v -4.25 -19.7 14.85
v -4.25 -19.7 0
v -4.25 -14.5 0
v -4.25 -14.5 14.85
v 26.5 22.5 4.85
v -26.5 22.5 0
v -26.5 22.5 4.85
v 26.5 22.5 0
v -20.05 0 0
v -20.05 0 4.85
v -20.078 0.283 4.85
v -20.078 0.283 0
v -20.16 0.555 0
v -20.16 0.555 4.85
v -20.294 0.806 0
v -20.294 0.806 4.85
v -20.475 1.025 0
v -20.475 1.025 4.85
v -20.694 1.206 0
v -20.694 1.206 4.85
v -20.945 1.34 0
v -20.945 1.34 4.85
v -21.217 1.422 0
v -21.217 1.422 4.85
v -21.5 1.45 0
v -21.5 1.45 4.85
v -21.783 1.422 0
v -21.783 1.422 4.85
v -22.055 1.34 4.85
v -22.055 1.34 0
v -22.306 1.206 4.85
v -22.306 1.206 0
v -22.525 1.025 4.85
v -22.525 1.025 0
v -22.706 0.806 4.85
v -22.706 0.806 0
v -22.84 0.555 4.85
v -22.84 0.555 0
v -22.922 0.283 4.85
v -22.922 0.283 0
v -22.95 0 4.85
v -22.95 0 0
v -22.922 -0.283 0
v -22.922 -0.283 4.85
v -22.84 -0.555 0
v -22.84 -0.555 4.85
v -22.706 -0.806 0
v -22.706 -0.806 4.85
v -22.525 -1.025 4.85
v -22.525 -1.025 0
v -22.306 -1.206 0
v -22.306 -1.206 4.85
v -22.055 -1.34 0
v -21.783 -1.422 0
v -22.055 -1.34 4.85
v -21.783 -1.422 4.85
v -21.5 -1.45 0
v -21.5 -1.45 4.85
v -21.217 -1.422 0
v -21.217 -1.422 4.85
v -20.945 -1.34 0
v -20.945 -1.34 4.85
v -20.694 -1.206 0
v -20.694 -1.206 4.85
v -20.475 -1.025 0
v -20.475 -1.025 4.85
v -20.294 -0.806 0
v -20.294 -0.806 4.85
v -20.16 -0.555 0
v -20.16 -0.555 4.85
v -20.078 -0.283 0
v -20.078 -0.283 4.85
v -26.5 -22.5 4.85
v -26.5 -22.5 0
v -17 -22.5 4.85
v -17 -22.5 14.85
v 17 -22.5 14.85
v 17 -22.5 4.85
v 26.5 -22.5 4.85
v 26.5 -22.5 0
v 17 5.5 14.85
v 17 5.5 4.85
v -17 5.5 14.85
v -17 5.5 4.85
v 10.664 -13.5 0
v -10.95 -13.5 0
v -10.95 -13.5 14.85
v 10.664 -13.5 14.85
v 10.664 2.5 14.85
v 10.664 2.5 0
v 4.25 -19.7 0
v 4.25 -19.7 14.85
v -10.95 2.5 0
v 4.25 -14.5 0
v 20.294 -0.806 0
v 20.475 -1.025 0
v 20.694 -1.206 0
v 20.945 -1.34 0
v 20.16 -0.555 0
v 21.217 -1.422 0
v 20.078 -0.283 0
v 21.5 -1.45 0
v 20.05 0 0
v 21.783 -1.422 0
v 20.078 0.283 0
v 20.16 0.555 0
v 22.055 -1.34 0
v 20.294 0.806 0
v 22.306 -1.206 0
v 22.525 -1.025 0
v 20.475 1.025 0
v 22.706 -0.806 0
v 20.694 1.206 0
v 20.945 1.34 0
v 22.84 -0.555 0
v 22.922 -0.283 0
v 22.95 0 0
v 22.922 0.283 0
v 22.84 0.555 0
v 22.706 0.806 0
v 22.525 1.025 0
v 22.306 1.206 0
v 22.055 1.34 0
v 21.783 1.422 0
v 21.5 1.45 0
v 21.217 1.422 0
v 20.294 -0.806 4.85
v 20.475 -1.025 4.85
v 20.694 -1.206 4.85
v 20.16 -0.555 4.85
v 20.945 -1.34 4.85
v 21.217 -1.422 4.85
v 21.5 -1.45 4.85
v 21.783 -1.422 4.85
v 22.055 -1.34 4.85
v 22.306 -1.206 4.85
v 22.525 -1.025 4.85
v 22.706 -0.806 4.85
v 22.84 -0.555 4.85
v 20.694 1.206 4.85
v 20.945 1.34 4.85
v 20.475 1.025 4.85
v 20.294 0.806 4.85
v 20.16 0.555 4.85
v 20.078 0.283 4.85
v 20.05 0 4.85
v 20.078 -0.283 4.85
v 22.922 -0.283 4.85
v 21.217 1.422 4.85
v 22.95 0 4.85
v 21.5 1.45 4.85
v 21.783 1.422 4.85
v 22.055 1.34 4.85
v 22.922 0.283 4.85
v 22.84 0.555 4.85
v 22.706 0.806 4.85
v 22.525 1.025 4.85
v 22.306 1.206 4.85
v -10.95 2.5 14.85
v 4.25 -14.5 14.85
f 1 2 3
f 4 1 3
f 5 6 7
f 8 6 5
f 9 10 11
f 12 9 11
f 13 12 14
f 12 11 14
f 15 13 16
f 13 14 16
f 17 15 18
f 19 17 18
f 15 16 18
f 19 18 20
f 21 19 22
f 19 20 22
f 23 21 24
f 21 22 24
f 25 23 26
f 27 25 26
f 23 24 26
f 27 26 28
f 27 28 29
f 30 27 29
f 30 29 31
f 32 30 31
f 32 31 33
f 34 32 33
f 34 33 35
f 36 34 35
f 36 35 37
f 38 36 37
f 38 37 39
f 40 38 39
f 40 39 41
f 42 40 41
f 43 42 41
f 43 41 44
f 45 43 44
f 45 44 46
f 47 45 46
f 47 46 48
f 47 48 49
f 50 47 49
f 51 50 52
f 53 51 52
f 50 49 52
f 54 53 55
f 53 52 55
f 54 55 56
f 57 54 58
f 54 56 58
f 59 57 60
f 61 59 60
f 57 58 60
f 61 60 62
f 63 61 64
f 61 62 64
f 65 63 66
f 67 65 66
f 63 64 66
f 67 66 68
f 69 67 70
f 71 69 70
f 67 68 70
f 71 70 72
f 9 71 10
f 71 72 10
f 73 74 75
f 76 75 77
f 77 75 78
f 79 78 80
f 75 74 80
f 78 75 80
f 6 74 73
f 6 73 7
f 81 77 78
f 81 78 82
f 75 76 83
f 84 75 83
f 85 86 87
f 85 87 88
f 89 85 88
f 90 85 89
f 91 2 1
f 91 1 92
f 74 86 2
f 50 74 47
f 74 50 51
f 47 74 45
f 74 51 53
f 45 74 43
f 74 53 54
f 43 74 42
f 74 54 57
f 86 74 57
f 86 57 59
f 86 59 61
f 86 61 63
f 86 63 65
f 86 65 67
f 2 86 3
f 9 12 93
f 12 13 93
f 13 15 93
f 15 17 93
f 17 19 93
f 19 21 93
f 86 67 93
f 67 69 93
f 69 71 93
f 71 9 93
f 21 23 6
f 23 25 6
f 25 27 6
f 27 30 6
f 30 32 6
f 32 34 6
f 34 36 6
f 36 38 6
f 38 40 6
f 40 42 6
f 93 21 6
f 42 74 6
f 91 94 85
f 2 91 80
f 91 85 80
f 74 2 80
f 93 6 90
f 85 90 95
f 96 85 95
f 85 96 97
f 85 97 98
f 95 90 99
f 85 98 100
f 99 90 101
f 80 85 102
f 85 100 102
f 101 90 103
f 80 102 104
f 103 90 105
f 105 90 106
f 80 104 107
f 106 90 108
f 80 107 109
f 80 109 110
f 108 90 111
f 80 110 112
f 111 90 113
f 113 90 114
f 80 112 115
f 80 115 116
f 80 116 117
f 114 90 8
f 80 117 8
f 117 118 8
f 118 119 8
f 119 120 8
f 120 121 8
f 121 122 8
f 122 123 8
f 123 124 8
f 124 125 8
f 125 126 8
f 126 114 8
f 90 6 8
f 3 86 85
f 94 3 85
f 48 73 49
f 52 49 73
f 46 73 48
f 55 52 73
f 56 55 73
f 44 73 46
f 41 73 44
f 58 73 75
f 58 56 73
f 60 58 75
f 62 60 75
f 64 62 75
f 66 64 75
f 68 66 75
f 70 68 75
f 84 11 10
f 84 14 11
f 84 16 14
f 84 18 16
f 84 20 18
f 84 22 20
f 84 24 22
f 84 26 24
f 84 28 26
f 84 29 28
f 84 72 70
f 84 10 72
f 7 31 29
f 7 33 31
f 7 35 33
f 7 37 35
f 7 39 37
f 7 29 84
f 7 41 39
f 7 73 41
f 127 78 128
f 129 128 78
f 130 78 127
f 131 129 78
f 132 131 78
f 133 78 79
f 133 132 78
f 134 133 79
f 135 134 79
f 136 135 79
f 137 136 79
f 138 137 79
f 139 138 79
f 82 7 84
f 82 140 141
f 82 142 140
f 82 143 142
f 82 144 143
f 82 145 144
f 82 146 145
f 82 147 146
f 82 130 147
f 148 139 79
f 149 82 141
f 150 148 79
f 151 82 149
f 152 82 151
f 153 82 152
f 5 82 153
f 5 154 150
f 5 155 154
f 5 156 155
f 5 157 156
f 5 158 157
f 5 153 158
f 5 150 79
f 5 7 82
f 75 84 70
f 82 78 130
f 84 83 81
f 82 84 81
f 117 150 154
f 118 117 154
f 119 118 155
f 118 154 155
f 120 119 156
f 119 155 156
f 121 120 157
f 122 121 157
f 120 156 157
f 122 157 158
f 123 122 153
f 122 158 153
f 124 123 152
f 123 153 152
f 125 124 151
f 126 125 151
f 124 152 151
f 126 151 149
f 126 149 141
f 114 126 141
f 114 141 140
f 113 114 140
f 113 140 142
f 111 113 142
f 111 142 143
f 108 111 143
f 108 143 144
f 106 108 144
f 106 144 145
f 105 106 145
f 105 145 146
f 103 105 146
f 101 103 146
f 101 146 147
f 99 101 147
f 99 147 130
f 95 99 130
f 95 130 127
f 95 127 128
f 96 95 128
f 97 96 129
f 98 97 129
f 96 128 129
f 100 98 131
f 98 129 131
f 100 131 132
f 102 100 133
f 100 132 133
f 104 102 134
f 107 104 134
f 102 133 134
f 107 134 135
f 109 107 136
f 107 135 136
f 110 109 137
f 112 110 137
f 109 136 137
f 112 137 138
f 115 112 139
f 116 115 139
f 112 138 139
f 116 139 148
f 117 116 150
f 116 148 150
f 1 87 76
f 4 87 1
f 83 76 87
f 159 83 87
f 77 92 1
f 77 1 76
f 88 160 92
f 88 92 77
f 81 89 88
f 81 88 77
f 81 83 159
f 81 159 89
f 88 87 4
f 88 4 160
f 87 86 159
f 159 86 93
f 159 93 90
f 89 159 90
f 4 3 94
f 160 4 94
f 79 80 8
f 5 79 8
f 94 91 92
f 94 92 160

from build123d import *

# Parameters (mm, degrees)
CROQUIS1_W              = 53
CROQUIS1_H              = 45
CROQUIS1_W_2            = 21.614146676
CROQUIS1_H_2            = 16
CROQUIS1_W_3            = 8.5
CROQUIS1_H_3            = 5.2
SALIENTE_EXTRUIR1_DEPTH = 14.85
CROQUIS2_W              = 9.5
CROQUIS2_H              = 45
CORTAR_EXTRUIR1_DEPTH   = 10
CROQUIS3_W              = 34
CROQUIS3_H              = 17
CORTAR_EXTRUIR2_DEPTH   = 10
CROQUIS4_R              = 1.45
CORTAR_EXTRUIR3_DEPTH   = 10


with BuildPart() as part:
    # Croquis1 → Saliente-Extruir1 (new body)
    with BuildSketch(Plane.XY):
        Rectangle(CROQUIS1_W, CROQUIS1_H)
        with Locations((-0.142926662, -5.5)):
            Rectangle(CROQUIS1_W_2, CROQUIS1_H_2, mode=Mode.SUBTRACT)
        with Locations((0, -17.1)):
            Rectangle(CROQUIS1_W_3, CROQUIS1_H_3, mode=Mode.SUBTRACT)
    extrude(amount=SALIENTE_EXTRUIR1_DEPTH)

    # Croquis2 → Cortar-Extruir1 (cut)
    with BuildSketch(Plane.XY.offset(14.85)):
        with Locations((21.75, 0)):
            Rectangle(CROQUIS2_W, CROQUIS2_H)
        with Locations((-21.75, 0)):
            Rectangle(CROQUIS2_W, CROQUIS2_H)
    extrude(amount=-CORTAR_EXTRUIR1_DEPTH, mode=Mode.SUBTRACT)

    # Croquis3 → Cortar-Extruir2 (cut)
    with BuildSketch(Plane.XY.offset(14.85)):
        with Locations((0, 14)):
            Rectangle(CROQUIS3_W, CROQUIS3_H)
    extrude(amount=-CORTAR_EXTRUIR2_DEPTH, mode=Mode.SUBTRACT)

    # Croquis4 → Cortar-Extruir3 (cut)
    with BuildSketch(Plane.XY.offset(4.85)):
        with Locations((-21.5, 0)):
            Circle(CROQUIS4_R)
        with Locations((21.5, 0)):
            Circle(CROQUIS4_R)
    extrude(amount=-CORTAR_EXTRUIR3_DEPTH, mode=Mode.SUBTRACT)


solid = part.part
